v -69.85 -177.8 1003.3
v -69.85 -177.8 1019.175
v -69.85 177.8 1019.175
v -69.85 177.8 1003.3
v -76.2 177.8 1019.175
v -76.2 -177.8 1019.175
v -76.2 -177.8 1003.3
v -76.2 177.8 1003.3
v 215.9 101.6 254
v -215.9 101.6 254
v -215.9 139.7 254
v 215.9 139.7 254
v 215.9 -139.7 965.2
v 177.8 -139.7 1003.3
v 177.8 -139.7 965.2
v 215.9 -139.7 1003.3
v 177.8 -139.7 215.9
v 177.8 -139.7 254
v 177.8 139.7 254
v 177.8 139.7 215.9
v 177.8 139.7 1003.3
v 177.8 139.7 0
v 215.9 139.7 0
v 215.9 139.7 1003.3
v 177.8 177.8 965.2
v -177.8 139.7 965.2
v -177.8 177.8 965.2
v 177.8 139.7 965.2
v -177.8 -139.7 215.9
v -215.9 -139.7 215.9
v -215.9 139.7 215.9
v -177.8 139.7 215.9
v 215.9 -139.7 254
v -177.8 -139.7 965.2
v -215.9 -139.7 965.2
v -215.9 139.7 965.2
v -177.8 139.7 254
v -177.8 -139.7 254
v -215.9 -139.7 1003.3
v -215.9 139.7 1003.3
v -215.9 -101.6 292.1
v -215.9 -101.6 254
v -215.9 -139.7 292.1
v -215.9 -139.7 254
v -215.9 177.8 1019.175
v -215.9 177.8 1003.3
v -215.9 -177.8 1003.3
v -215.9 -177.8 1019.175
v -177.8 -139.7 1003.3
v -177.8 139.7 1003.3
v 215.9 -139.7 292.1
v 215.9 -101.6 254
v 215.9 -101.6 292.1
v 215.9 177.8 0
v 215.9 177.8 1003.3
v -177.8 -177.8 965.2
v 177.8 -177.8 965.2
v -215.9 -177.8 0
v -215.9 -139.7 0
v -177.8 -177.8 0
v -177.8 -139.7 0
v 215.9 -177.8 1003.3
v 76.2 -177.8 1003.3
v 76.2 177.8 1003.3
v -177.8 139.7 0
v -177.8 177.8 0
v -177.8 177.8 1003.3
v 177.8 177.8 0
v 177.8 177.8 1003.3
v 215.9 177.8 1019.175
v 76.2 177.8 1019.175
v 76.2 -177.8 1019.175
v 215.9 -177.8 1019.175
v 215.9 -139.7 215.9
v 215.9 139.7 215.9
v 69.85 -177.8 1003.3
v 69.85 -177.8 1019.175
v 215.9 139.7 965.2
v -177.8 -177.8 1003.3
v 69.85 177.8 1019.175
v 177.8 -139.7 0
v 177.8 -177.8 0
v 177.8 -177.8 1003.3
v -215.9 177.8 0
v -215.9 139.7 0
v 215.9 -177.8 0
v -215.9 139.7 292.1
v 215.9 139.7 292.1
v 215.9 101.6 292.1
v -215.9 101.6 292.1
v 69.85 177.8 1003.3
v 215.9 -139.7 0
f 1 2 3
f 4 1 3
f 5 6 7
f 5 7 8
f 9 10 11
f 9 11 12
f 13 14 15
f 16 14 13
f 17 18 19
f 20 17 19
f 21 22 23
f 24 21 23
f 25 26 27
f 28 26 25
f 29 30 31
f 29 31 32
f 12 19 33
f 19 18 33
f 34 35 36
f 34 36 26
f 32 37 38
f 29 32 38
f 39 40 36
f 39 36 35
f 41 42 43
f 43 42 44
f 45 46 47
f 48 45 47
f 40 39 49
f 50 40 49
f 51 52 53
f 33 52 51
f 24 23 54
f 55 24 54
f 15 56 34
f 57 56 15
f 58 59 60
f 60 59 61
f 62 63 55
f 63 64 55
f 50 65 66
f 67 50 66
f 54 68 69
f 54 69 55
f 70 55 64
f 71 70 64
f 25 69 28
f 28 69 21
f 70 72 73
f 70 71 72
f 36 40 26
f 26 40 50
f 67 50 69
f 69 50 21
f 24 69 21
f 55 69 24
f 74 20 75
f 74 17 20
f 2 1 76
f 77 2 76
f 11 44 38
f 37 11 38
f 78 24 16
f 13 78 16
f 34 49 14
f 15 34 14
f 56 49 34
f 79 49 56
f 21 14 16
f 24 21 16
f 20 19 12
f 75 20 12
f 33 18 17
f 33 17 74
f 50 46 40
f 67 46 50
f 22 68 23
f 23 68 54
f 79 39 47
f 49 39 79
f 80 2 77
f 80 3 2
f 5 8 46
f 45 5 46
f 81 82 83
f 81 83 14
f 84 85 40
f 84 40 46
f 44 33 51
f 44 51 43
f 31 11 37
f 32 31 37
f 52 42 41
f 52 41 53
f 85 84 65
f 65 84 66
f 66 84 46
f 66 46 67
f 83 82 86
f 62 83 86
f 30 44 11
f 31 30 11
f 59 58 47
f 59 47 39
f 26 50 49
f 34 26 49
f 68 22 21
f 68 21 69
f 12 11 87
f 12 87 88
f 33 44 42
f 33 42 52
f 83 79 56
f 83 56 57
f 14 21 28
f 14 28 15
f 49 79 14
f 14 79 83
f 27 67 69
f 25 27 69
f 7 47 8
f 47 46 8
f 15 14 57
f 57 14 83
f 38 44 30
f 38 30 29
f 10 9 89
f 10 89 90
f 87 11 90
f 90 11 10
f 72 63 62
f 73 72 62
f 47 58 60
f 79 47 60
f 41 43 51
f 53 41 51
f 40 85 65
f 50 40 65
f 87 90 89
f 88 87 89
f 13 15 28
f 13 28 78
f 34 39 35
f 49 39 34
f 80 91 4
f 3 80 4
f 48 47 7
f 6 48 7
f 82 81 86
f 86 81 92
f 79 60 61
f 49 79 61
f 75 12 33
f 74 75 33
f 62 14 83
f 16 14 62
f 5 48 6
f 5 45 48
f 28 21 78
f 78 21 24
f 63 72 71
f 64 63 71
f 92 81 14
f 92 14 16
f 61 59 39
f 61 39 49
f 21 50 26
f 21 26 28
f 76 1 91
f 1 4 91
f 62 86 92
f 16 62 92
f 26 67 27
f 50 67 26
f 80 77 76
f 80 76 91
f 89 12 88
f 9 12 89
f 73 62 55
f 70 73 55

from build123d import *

# Parameters (mm, degrees)
F0_W      = 38.1
F0_H      = 38.1
F1_DEPTH  = 1003.3
F2_W      = 38.1
F2_H      = 38.1
F3_DEPTH  = 15.875
F4_W      = 355.6
F4_H      = 38.1
F5_DEPTH  = 38.1
F4_W_2    = 38.1
F4_H_2    = 279.4
F7_W      = 38.1
F7_H      = 203.2
F7_H_2    = 38.1
F8_DEPTH  = 38.1
F7_W_2    = 355.6
F9_DEPTH  = 38.1
F10_W     = 6.35
F10_H     = 355.6
F11_DEPTH = 1019.176


with BuildPart() as f1:
    # F0 (on Top) → F1 (new body)
    with BuildSketch(Plane.XY):
        with Locations((-196.85, 158.75)):
            Rectangle(F0_W, F0_H)
    extrude(amount=F1_DEPTH)


with BuildPart() as f1b:
    # F0 (on Top) → F1, piece 2 (new body)
    with BuildSketch(Plane.XY):
        with Locations((-196.85, -158.75)):
            Rectangle(F0_W, F0_H)
    extrude(amount=F1_DEPTH)


with BuildPart() as f1c:
    # F0 (on Top) → F1, piece 3 (new body)
    with BuildSketch(Plane.XY):
        with Locations((196.85, -158.75)):
            Rectangle(F0_W, F0_H)
    extrude(amount=F1_DEPTH)


with BuildPart() as f1d:
    # F0 (on Top) → F1, piece 4 (new body)
    with BuildSketch(Plane.XY):
        with Locations((196.85, 158.75)):
            Rectangle(F0_W, F0_H)
    extrude(amount=F1_DEPTH)


with BuildPart() as f3:
    # F2 (on face) → F3 (new body)
    with BuildSketch(Plane.XY.offset(1003.3)):
        Polygon((215.9, -177.8), (215.9, 177.8), (-215.9, 177.8), (-215.9, -139.7), (-177.8, -139.7), (-177.8, -177.8), align=None)
        with Locations((-196.85, -158.75)):
            Rectangle(F2_W, F2_H)
    extrude(amount=F3_DEPTH)

    # F10 (on face) → F11 (cut, through all)
    with BuildSketch(Plane.XY.offset(1019.175)):
        with Locations((-73.025, 0)):
            Rectangle(F10_W, F10_H)
        with Locations((73.025, 0)):
            Rectangle(F10_W, F10_H)
    extrude(amount=-F11_DEPTH, mode=Mode.SUBTRACT)


with BuildPart() as f5:
    # F4 (on face) → F5 (new body)
    with BuildSketch(Plane(origin=(0, 0, 1003.3), x_dir=(1, 0, 0), z_dir=(0, 0, -1))):
        with Locations((0, 158.75)):
            Rectangle(F4_W, F4_H)
    extrude(amount=F5_DEPTH)


with BuildPart() as f5b:
    # F4 (on face) → F5, piece 2 (new body)
    with BuildSketch(Plane(origin=(0, 0, 1003.3), x_dir=(1, 0, 0), z_dir=(0, 0, -1))):
        with Locations((0, -158.75)):
            Rectangle(F4_W, F4_H)
    extrude(amount=F5_DEPTH)


with BuildPart() as f5c:
    # F4 (on face) → F5, piece 3 (new body)
    with BuildSketch(Plane(origin=(0, 0, 1003.3), x_dir=(1, 0, 0), z_dir=(0, 0, -1))):
        with Locations((-196.85, 0)):
            Rectangle(F4_W_2, F4_H_2)
    extrude(amount=F5_DEPTH)


with BuildPart() as f5d:
    # F4 (on face) → F5, piece 4 (new body)
    with BuildSketch(Plane(origin=(0, 0, 1003.3), x_dir=(1, 0, 0), z_dir=(0, 0, -1))):
        with Locations((196.85, 0)):
            Rectangle(F4_W_2, F4_H_2)
    extrude(amount=F5_DEPTH)


with BuildPart() as f8:
    # F7 (on offset) → F8 (new body)
    with BuildSketch(Plane(origin=(0, 0, 254), x_dir=(1, 0, 0), z_dir=(0, 0, -1))):
        with Locations((196.85, 0)):
            Rectangle(F7_W, F7_H)
        with Locations((196.85, -120.65)):
            Rectangle(F7_W, F7_H_2)
        with Locations((196.85, 120.65)):
            Rectangle(F7_W, F7_H_2)
    extrude(amount=F8_DEPTH)


with BuildPart() as f8b:
    # F7 (on offset) → F8, piece 2 (new body)
    with BuildSketch(Plane(origin=(0, 0, 254), x_dir=(1, 0, 0), z_dir=(0, 0, -1))):
        with Locations((-196.85, 120.65)):
            Rectangle(F7_W, F7_H_2)
        with Locations((-196.85, 0)):
            Rectangle(F7_W, F7_H)
        with Locations((-196.85, -120.65)):
            Rectangle(F7_W, F7_H_2)
    extrude(amount=F8_DEPTH)


with BuildPart() as f9:
    # F7 (on offset) → F9 (new body)
    with BuildSketch(Plane(origin=(0, 0, 254), x_dir=(1, 0, 0), z_dir=(0, 0, -1))):
        with Locations((196.85, 120.65)):
            Rectangle(F7_W, F7_H_2)
        with Locations((0, 120.65)):
            Rectangle(F7_W_2, F7_H_2)
        with Locations((-196.85, 120.65)):
            Rectangle(F7_W, F7_H_2)
    extrude(amount=-F9_DEPTH)


with BuildPart() as f9b:
    # F7 (on offset) → F9, piece 2 (new body)
    with BuildSketch(Plane(origin=(0, 0, 254), x_dir=(1, 0, 0), z_dir=(0, 0, -1))):
        with Locations((-196.85, -120.65)):
            Rectangle(F7_W, F7_H_2)
        with Locations((0, -120.65)):
            Rectangle(F7_W_2, F7_H_2)
        with Locations((196.85, -120.65)):
            Rectangle(F7_W, F7_H_2)
    extrude(amount=-F9_DEPTH)


solid = Compound([f1.part, f1b.part, f1c.part, f1d.part, f3.part, f5.part, f5b.part, f5c.part, f5d.part, f8.part, f8b.part, f9.part, f9b.part])
